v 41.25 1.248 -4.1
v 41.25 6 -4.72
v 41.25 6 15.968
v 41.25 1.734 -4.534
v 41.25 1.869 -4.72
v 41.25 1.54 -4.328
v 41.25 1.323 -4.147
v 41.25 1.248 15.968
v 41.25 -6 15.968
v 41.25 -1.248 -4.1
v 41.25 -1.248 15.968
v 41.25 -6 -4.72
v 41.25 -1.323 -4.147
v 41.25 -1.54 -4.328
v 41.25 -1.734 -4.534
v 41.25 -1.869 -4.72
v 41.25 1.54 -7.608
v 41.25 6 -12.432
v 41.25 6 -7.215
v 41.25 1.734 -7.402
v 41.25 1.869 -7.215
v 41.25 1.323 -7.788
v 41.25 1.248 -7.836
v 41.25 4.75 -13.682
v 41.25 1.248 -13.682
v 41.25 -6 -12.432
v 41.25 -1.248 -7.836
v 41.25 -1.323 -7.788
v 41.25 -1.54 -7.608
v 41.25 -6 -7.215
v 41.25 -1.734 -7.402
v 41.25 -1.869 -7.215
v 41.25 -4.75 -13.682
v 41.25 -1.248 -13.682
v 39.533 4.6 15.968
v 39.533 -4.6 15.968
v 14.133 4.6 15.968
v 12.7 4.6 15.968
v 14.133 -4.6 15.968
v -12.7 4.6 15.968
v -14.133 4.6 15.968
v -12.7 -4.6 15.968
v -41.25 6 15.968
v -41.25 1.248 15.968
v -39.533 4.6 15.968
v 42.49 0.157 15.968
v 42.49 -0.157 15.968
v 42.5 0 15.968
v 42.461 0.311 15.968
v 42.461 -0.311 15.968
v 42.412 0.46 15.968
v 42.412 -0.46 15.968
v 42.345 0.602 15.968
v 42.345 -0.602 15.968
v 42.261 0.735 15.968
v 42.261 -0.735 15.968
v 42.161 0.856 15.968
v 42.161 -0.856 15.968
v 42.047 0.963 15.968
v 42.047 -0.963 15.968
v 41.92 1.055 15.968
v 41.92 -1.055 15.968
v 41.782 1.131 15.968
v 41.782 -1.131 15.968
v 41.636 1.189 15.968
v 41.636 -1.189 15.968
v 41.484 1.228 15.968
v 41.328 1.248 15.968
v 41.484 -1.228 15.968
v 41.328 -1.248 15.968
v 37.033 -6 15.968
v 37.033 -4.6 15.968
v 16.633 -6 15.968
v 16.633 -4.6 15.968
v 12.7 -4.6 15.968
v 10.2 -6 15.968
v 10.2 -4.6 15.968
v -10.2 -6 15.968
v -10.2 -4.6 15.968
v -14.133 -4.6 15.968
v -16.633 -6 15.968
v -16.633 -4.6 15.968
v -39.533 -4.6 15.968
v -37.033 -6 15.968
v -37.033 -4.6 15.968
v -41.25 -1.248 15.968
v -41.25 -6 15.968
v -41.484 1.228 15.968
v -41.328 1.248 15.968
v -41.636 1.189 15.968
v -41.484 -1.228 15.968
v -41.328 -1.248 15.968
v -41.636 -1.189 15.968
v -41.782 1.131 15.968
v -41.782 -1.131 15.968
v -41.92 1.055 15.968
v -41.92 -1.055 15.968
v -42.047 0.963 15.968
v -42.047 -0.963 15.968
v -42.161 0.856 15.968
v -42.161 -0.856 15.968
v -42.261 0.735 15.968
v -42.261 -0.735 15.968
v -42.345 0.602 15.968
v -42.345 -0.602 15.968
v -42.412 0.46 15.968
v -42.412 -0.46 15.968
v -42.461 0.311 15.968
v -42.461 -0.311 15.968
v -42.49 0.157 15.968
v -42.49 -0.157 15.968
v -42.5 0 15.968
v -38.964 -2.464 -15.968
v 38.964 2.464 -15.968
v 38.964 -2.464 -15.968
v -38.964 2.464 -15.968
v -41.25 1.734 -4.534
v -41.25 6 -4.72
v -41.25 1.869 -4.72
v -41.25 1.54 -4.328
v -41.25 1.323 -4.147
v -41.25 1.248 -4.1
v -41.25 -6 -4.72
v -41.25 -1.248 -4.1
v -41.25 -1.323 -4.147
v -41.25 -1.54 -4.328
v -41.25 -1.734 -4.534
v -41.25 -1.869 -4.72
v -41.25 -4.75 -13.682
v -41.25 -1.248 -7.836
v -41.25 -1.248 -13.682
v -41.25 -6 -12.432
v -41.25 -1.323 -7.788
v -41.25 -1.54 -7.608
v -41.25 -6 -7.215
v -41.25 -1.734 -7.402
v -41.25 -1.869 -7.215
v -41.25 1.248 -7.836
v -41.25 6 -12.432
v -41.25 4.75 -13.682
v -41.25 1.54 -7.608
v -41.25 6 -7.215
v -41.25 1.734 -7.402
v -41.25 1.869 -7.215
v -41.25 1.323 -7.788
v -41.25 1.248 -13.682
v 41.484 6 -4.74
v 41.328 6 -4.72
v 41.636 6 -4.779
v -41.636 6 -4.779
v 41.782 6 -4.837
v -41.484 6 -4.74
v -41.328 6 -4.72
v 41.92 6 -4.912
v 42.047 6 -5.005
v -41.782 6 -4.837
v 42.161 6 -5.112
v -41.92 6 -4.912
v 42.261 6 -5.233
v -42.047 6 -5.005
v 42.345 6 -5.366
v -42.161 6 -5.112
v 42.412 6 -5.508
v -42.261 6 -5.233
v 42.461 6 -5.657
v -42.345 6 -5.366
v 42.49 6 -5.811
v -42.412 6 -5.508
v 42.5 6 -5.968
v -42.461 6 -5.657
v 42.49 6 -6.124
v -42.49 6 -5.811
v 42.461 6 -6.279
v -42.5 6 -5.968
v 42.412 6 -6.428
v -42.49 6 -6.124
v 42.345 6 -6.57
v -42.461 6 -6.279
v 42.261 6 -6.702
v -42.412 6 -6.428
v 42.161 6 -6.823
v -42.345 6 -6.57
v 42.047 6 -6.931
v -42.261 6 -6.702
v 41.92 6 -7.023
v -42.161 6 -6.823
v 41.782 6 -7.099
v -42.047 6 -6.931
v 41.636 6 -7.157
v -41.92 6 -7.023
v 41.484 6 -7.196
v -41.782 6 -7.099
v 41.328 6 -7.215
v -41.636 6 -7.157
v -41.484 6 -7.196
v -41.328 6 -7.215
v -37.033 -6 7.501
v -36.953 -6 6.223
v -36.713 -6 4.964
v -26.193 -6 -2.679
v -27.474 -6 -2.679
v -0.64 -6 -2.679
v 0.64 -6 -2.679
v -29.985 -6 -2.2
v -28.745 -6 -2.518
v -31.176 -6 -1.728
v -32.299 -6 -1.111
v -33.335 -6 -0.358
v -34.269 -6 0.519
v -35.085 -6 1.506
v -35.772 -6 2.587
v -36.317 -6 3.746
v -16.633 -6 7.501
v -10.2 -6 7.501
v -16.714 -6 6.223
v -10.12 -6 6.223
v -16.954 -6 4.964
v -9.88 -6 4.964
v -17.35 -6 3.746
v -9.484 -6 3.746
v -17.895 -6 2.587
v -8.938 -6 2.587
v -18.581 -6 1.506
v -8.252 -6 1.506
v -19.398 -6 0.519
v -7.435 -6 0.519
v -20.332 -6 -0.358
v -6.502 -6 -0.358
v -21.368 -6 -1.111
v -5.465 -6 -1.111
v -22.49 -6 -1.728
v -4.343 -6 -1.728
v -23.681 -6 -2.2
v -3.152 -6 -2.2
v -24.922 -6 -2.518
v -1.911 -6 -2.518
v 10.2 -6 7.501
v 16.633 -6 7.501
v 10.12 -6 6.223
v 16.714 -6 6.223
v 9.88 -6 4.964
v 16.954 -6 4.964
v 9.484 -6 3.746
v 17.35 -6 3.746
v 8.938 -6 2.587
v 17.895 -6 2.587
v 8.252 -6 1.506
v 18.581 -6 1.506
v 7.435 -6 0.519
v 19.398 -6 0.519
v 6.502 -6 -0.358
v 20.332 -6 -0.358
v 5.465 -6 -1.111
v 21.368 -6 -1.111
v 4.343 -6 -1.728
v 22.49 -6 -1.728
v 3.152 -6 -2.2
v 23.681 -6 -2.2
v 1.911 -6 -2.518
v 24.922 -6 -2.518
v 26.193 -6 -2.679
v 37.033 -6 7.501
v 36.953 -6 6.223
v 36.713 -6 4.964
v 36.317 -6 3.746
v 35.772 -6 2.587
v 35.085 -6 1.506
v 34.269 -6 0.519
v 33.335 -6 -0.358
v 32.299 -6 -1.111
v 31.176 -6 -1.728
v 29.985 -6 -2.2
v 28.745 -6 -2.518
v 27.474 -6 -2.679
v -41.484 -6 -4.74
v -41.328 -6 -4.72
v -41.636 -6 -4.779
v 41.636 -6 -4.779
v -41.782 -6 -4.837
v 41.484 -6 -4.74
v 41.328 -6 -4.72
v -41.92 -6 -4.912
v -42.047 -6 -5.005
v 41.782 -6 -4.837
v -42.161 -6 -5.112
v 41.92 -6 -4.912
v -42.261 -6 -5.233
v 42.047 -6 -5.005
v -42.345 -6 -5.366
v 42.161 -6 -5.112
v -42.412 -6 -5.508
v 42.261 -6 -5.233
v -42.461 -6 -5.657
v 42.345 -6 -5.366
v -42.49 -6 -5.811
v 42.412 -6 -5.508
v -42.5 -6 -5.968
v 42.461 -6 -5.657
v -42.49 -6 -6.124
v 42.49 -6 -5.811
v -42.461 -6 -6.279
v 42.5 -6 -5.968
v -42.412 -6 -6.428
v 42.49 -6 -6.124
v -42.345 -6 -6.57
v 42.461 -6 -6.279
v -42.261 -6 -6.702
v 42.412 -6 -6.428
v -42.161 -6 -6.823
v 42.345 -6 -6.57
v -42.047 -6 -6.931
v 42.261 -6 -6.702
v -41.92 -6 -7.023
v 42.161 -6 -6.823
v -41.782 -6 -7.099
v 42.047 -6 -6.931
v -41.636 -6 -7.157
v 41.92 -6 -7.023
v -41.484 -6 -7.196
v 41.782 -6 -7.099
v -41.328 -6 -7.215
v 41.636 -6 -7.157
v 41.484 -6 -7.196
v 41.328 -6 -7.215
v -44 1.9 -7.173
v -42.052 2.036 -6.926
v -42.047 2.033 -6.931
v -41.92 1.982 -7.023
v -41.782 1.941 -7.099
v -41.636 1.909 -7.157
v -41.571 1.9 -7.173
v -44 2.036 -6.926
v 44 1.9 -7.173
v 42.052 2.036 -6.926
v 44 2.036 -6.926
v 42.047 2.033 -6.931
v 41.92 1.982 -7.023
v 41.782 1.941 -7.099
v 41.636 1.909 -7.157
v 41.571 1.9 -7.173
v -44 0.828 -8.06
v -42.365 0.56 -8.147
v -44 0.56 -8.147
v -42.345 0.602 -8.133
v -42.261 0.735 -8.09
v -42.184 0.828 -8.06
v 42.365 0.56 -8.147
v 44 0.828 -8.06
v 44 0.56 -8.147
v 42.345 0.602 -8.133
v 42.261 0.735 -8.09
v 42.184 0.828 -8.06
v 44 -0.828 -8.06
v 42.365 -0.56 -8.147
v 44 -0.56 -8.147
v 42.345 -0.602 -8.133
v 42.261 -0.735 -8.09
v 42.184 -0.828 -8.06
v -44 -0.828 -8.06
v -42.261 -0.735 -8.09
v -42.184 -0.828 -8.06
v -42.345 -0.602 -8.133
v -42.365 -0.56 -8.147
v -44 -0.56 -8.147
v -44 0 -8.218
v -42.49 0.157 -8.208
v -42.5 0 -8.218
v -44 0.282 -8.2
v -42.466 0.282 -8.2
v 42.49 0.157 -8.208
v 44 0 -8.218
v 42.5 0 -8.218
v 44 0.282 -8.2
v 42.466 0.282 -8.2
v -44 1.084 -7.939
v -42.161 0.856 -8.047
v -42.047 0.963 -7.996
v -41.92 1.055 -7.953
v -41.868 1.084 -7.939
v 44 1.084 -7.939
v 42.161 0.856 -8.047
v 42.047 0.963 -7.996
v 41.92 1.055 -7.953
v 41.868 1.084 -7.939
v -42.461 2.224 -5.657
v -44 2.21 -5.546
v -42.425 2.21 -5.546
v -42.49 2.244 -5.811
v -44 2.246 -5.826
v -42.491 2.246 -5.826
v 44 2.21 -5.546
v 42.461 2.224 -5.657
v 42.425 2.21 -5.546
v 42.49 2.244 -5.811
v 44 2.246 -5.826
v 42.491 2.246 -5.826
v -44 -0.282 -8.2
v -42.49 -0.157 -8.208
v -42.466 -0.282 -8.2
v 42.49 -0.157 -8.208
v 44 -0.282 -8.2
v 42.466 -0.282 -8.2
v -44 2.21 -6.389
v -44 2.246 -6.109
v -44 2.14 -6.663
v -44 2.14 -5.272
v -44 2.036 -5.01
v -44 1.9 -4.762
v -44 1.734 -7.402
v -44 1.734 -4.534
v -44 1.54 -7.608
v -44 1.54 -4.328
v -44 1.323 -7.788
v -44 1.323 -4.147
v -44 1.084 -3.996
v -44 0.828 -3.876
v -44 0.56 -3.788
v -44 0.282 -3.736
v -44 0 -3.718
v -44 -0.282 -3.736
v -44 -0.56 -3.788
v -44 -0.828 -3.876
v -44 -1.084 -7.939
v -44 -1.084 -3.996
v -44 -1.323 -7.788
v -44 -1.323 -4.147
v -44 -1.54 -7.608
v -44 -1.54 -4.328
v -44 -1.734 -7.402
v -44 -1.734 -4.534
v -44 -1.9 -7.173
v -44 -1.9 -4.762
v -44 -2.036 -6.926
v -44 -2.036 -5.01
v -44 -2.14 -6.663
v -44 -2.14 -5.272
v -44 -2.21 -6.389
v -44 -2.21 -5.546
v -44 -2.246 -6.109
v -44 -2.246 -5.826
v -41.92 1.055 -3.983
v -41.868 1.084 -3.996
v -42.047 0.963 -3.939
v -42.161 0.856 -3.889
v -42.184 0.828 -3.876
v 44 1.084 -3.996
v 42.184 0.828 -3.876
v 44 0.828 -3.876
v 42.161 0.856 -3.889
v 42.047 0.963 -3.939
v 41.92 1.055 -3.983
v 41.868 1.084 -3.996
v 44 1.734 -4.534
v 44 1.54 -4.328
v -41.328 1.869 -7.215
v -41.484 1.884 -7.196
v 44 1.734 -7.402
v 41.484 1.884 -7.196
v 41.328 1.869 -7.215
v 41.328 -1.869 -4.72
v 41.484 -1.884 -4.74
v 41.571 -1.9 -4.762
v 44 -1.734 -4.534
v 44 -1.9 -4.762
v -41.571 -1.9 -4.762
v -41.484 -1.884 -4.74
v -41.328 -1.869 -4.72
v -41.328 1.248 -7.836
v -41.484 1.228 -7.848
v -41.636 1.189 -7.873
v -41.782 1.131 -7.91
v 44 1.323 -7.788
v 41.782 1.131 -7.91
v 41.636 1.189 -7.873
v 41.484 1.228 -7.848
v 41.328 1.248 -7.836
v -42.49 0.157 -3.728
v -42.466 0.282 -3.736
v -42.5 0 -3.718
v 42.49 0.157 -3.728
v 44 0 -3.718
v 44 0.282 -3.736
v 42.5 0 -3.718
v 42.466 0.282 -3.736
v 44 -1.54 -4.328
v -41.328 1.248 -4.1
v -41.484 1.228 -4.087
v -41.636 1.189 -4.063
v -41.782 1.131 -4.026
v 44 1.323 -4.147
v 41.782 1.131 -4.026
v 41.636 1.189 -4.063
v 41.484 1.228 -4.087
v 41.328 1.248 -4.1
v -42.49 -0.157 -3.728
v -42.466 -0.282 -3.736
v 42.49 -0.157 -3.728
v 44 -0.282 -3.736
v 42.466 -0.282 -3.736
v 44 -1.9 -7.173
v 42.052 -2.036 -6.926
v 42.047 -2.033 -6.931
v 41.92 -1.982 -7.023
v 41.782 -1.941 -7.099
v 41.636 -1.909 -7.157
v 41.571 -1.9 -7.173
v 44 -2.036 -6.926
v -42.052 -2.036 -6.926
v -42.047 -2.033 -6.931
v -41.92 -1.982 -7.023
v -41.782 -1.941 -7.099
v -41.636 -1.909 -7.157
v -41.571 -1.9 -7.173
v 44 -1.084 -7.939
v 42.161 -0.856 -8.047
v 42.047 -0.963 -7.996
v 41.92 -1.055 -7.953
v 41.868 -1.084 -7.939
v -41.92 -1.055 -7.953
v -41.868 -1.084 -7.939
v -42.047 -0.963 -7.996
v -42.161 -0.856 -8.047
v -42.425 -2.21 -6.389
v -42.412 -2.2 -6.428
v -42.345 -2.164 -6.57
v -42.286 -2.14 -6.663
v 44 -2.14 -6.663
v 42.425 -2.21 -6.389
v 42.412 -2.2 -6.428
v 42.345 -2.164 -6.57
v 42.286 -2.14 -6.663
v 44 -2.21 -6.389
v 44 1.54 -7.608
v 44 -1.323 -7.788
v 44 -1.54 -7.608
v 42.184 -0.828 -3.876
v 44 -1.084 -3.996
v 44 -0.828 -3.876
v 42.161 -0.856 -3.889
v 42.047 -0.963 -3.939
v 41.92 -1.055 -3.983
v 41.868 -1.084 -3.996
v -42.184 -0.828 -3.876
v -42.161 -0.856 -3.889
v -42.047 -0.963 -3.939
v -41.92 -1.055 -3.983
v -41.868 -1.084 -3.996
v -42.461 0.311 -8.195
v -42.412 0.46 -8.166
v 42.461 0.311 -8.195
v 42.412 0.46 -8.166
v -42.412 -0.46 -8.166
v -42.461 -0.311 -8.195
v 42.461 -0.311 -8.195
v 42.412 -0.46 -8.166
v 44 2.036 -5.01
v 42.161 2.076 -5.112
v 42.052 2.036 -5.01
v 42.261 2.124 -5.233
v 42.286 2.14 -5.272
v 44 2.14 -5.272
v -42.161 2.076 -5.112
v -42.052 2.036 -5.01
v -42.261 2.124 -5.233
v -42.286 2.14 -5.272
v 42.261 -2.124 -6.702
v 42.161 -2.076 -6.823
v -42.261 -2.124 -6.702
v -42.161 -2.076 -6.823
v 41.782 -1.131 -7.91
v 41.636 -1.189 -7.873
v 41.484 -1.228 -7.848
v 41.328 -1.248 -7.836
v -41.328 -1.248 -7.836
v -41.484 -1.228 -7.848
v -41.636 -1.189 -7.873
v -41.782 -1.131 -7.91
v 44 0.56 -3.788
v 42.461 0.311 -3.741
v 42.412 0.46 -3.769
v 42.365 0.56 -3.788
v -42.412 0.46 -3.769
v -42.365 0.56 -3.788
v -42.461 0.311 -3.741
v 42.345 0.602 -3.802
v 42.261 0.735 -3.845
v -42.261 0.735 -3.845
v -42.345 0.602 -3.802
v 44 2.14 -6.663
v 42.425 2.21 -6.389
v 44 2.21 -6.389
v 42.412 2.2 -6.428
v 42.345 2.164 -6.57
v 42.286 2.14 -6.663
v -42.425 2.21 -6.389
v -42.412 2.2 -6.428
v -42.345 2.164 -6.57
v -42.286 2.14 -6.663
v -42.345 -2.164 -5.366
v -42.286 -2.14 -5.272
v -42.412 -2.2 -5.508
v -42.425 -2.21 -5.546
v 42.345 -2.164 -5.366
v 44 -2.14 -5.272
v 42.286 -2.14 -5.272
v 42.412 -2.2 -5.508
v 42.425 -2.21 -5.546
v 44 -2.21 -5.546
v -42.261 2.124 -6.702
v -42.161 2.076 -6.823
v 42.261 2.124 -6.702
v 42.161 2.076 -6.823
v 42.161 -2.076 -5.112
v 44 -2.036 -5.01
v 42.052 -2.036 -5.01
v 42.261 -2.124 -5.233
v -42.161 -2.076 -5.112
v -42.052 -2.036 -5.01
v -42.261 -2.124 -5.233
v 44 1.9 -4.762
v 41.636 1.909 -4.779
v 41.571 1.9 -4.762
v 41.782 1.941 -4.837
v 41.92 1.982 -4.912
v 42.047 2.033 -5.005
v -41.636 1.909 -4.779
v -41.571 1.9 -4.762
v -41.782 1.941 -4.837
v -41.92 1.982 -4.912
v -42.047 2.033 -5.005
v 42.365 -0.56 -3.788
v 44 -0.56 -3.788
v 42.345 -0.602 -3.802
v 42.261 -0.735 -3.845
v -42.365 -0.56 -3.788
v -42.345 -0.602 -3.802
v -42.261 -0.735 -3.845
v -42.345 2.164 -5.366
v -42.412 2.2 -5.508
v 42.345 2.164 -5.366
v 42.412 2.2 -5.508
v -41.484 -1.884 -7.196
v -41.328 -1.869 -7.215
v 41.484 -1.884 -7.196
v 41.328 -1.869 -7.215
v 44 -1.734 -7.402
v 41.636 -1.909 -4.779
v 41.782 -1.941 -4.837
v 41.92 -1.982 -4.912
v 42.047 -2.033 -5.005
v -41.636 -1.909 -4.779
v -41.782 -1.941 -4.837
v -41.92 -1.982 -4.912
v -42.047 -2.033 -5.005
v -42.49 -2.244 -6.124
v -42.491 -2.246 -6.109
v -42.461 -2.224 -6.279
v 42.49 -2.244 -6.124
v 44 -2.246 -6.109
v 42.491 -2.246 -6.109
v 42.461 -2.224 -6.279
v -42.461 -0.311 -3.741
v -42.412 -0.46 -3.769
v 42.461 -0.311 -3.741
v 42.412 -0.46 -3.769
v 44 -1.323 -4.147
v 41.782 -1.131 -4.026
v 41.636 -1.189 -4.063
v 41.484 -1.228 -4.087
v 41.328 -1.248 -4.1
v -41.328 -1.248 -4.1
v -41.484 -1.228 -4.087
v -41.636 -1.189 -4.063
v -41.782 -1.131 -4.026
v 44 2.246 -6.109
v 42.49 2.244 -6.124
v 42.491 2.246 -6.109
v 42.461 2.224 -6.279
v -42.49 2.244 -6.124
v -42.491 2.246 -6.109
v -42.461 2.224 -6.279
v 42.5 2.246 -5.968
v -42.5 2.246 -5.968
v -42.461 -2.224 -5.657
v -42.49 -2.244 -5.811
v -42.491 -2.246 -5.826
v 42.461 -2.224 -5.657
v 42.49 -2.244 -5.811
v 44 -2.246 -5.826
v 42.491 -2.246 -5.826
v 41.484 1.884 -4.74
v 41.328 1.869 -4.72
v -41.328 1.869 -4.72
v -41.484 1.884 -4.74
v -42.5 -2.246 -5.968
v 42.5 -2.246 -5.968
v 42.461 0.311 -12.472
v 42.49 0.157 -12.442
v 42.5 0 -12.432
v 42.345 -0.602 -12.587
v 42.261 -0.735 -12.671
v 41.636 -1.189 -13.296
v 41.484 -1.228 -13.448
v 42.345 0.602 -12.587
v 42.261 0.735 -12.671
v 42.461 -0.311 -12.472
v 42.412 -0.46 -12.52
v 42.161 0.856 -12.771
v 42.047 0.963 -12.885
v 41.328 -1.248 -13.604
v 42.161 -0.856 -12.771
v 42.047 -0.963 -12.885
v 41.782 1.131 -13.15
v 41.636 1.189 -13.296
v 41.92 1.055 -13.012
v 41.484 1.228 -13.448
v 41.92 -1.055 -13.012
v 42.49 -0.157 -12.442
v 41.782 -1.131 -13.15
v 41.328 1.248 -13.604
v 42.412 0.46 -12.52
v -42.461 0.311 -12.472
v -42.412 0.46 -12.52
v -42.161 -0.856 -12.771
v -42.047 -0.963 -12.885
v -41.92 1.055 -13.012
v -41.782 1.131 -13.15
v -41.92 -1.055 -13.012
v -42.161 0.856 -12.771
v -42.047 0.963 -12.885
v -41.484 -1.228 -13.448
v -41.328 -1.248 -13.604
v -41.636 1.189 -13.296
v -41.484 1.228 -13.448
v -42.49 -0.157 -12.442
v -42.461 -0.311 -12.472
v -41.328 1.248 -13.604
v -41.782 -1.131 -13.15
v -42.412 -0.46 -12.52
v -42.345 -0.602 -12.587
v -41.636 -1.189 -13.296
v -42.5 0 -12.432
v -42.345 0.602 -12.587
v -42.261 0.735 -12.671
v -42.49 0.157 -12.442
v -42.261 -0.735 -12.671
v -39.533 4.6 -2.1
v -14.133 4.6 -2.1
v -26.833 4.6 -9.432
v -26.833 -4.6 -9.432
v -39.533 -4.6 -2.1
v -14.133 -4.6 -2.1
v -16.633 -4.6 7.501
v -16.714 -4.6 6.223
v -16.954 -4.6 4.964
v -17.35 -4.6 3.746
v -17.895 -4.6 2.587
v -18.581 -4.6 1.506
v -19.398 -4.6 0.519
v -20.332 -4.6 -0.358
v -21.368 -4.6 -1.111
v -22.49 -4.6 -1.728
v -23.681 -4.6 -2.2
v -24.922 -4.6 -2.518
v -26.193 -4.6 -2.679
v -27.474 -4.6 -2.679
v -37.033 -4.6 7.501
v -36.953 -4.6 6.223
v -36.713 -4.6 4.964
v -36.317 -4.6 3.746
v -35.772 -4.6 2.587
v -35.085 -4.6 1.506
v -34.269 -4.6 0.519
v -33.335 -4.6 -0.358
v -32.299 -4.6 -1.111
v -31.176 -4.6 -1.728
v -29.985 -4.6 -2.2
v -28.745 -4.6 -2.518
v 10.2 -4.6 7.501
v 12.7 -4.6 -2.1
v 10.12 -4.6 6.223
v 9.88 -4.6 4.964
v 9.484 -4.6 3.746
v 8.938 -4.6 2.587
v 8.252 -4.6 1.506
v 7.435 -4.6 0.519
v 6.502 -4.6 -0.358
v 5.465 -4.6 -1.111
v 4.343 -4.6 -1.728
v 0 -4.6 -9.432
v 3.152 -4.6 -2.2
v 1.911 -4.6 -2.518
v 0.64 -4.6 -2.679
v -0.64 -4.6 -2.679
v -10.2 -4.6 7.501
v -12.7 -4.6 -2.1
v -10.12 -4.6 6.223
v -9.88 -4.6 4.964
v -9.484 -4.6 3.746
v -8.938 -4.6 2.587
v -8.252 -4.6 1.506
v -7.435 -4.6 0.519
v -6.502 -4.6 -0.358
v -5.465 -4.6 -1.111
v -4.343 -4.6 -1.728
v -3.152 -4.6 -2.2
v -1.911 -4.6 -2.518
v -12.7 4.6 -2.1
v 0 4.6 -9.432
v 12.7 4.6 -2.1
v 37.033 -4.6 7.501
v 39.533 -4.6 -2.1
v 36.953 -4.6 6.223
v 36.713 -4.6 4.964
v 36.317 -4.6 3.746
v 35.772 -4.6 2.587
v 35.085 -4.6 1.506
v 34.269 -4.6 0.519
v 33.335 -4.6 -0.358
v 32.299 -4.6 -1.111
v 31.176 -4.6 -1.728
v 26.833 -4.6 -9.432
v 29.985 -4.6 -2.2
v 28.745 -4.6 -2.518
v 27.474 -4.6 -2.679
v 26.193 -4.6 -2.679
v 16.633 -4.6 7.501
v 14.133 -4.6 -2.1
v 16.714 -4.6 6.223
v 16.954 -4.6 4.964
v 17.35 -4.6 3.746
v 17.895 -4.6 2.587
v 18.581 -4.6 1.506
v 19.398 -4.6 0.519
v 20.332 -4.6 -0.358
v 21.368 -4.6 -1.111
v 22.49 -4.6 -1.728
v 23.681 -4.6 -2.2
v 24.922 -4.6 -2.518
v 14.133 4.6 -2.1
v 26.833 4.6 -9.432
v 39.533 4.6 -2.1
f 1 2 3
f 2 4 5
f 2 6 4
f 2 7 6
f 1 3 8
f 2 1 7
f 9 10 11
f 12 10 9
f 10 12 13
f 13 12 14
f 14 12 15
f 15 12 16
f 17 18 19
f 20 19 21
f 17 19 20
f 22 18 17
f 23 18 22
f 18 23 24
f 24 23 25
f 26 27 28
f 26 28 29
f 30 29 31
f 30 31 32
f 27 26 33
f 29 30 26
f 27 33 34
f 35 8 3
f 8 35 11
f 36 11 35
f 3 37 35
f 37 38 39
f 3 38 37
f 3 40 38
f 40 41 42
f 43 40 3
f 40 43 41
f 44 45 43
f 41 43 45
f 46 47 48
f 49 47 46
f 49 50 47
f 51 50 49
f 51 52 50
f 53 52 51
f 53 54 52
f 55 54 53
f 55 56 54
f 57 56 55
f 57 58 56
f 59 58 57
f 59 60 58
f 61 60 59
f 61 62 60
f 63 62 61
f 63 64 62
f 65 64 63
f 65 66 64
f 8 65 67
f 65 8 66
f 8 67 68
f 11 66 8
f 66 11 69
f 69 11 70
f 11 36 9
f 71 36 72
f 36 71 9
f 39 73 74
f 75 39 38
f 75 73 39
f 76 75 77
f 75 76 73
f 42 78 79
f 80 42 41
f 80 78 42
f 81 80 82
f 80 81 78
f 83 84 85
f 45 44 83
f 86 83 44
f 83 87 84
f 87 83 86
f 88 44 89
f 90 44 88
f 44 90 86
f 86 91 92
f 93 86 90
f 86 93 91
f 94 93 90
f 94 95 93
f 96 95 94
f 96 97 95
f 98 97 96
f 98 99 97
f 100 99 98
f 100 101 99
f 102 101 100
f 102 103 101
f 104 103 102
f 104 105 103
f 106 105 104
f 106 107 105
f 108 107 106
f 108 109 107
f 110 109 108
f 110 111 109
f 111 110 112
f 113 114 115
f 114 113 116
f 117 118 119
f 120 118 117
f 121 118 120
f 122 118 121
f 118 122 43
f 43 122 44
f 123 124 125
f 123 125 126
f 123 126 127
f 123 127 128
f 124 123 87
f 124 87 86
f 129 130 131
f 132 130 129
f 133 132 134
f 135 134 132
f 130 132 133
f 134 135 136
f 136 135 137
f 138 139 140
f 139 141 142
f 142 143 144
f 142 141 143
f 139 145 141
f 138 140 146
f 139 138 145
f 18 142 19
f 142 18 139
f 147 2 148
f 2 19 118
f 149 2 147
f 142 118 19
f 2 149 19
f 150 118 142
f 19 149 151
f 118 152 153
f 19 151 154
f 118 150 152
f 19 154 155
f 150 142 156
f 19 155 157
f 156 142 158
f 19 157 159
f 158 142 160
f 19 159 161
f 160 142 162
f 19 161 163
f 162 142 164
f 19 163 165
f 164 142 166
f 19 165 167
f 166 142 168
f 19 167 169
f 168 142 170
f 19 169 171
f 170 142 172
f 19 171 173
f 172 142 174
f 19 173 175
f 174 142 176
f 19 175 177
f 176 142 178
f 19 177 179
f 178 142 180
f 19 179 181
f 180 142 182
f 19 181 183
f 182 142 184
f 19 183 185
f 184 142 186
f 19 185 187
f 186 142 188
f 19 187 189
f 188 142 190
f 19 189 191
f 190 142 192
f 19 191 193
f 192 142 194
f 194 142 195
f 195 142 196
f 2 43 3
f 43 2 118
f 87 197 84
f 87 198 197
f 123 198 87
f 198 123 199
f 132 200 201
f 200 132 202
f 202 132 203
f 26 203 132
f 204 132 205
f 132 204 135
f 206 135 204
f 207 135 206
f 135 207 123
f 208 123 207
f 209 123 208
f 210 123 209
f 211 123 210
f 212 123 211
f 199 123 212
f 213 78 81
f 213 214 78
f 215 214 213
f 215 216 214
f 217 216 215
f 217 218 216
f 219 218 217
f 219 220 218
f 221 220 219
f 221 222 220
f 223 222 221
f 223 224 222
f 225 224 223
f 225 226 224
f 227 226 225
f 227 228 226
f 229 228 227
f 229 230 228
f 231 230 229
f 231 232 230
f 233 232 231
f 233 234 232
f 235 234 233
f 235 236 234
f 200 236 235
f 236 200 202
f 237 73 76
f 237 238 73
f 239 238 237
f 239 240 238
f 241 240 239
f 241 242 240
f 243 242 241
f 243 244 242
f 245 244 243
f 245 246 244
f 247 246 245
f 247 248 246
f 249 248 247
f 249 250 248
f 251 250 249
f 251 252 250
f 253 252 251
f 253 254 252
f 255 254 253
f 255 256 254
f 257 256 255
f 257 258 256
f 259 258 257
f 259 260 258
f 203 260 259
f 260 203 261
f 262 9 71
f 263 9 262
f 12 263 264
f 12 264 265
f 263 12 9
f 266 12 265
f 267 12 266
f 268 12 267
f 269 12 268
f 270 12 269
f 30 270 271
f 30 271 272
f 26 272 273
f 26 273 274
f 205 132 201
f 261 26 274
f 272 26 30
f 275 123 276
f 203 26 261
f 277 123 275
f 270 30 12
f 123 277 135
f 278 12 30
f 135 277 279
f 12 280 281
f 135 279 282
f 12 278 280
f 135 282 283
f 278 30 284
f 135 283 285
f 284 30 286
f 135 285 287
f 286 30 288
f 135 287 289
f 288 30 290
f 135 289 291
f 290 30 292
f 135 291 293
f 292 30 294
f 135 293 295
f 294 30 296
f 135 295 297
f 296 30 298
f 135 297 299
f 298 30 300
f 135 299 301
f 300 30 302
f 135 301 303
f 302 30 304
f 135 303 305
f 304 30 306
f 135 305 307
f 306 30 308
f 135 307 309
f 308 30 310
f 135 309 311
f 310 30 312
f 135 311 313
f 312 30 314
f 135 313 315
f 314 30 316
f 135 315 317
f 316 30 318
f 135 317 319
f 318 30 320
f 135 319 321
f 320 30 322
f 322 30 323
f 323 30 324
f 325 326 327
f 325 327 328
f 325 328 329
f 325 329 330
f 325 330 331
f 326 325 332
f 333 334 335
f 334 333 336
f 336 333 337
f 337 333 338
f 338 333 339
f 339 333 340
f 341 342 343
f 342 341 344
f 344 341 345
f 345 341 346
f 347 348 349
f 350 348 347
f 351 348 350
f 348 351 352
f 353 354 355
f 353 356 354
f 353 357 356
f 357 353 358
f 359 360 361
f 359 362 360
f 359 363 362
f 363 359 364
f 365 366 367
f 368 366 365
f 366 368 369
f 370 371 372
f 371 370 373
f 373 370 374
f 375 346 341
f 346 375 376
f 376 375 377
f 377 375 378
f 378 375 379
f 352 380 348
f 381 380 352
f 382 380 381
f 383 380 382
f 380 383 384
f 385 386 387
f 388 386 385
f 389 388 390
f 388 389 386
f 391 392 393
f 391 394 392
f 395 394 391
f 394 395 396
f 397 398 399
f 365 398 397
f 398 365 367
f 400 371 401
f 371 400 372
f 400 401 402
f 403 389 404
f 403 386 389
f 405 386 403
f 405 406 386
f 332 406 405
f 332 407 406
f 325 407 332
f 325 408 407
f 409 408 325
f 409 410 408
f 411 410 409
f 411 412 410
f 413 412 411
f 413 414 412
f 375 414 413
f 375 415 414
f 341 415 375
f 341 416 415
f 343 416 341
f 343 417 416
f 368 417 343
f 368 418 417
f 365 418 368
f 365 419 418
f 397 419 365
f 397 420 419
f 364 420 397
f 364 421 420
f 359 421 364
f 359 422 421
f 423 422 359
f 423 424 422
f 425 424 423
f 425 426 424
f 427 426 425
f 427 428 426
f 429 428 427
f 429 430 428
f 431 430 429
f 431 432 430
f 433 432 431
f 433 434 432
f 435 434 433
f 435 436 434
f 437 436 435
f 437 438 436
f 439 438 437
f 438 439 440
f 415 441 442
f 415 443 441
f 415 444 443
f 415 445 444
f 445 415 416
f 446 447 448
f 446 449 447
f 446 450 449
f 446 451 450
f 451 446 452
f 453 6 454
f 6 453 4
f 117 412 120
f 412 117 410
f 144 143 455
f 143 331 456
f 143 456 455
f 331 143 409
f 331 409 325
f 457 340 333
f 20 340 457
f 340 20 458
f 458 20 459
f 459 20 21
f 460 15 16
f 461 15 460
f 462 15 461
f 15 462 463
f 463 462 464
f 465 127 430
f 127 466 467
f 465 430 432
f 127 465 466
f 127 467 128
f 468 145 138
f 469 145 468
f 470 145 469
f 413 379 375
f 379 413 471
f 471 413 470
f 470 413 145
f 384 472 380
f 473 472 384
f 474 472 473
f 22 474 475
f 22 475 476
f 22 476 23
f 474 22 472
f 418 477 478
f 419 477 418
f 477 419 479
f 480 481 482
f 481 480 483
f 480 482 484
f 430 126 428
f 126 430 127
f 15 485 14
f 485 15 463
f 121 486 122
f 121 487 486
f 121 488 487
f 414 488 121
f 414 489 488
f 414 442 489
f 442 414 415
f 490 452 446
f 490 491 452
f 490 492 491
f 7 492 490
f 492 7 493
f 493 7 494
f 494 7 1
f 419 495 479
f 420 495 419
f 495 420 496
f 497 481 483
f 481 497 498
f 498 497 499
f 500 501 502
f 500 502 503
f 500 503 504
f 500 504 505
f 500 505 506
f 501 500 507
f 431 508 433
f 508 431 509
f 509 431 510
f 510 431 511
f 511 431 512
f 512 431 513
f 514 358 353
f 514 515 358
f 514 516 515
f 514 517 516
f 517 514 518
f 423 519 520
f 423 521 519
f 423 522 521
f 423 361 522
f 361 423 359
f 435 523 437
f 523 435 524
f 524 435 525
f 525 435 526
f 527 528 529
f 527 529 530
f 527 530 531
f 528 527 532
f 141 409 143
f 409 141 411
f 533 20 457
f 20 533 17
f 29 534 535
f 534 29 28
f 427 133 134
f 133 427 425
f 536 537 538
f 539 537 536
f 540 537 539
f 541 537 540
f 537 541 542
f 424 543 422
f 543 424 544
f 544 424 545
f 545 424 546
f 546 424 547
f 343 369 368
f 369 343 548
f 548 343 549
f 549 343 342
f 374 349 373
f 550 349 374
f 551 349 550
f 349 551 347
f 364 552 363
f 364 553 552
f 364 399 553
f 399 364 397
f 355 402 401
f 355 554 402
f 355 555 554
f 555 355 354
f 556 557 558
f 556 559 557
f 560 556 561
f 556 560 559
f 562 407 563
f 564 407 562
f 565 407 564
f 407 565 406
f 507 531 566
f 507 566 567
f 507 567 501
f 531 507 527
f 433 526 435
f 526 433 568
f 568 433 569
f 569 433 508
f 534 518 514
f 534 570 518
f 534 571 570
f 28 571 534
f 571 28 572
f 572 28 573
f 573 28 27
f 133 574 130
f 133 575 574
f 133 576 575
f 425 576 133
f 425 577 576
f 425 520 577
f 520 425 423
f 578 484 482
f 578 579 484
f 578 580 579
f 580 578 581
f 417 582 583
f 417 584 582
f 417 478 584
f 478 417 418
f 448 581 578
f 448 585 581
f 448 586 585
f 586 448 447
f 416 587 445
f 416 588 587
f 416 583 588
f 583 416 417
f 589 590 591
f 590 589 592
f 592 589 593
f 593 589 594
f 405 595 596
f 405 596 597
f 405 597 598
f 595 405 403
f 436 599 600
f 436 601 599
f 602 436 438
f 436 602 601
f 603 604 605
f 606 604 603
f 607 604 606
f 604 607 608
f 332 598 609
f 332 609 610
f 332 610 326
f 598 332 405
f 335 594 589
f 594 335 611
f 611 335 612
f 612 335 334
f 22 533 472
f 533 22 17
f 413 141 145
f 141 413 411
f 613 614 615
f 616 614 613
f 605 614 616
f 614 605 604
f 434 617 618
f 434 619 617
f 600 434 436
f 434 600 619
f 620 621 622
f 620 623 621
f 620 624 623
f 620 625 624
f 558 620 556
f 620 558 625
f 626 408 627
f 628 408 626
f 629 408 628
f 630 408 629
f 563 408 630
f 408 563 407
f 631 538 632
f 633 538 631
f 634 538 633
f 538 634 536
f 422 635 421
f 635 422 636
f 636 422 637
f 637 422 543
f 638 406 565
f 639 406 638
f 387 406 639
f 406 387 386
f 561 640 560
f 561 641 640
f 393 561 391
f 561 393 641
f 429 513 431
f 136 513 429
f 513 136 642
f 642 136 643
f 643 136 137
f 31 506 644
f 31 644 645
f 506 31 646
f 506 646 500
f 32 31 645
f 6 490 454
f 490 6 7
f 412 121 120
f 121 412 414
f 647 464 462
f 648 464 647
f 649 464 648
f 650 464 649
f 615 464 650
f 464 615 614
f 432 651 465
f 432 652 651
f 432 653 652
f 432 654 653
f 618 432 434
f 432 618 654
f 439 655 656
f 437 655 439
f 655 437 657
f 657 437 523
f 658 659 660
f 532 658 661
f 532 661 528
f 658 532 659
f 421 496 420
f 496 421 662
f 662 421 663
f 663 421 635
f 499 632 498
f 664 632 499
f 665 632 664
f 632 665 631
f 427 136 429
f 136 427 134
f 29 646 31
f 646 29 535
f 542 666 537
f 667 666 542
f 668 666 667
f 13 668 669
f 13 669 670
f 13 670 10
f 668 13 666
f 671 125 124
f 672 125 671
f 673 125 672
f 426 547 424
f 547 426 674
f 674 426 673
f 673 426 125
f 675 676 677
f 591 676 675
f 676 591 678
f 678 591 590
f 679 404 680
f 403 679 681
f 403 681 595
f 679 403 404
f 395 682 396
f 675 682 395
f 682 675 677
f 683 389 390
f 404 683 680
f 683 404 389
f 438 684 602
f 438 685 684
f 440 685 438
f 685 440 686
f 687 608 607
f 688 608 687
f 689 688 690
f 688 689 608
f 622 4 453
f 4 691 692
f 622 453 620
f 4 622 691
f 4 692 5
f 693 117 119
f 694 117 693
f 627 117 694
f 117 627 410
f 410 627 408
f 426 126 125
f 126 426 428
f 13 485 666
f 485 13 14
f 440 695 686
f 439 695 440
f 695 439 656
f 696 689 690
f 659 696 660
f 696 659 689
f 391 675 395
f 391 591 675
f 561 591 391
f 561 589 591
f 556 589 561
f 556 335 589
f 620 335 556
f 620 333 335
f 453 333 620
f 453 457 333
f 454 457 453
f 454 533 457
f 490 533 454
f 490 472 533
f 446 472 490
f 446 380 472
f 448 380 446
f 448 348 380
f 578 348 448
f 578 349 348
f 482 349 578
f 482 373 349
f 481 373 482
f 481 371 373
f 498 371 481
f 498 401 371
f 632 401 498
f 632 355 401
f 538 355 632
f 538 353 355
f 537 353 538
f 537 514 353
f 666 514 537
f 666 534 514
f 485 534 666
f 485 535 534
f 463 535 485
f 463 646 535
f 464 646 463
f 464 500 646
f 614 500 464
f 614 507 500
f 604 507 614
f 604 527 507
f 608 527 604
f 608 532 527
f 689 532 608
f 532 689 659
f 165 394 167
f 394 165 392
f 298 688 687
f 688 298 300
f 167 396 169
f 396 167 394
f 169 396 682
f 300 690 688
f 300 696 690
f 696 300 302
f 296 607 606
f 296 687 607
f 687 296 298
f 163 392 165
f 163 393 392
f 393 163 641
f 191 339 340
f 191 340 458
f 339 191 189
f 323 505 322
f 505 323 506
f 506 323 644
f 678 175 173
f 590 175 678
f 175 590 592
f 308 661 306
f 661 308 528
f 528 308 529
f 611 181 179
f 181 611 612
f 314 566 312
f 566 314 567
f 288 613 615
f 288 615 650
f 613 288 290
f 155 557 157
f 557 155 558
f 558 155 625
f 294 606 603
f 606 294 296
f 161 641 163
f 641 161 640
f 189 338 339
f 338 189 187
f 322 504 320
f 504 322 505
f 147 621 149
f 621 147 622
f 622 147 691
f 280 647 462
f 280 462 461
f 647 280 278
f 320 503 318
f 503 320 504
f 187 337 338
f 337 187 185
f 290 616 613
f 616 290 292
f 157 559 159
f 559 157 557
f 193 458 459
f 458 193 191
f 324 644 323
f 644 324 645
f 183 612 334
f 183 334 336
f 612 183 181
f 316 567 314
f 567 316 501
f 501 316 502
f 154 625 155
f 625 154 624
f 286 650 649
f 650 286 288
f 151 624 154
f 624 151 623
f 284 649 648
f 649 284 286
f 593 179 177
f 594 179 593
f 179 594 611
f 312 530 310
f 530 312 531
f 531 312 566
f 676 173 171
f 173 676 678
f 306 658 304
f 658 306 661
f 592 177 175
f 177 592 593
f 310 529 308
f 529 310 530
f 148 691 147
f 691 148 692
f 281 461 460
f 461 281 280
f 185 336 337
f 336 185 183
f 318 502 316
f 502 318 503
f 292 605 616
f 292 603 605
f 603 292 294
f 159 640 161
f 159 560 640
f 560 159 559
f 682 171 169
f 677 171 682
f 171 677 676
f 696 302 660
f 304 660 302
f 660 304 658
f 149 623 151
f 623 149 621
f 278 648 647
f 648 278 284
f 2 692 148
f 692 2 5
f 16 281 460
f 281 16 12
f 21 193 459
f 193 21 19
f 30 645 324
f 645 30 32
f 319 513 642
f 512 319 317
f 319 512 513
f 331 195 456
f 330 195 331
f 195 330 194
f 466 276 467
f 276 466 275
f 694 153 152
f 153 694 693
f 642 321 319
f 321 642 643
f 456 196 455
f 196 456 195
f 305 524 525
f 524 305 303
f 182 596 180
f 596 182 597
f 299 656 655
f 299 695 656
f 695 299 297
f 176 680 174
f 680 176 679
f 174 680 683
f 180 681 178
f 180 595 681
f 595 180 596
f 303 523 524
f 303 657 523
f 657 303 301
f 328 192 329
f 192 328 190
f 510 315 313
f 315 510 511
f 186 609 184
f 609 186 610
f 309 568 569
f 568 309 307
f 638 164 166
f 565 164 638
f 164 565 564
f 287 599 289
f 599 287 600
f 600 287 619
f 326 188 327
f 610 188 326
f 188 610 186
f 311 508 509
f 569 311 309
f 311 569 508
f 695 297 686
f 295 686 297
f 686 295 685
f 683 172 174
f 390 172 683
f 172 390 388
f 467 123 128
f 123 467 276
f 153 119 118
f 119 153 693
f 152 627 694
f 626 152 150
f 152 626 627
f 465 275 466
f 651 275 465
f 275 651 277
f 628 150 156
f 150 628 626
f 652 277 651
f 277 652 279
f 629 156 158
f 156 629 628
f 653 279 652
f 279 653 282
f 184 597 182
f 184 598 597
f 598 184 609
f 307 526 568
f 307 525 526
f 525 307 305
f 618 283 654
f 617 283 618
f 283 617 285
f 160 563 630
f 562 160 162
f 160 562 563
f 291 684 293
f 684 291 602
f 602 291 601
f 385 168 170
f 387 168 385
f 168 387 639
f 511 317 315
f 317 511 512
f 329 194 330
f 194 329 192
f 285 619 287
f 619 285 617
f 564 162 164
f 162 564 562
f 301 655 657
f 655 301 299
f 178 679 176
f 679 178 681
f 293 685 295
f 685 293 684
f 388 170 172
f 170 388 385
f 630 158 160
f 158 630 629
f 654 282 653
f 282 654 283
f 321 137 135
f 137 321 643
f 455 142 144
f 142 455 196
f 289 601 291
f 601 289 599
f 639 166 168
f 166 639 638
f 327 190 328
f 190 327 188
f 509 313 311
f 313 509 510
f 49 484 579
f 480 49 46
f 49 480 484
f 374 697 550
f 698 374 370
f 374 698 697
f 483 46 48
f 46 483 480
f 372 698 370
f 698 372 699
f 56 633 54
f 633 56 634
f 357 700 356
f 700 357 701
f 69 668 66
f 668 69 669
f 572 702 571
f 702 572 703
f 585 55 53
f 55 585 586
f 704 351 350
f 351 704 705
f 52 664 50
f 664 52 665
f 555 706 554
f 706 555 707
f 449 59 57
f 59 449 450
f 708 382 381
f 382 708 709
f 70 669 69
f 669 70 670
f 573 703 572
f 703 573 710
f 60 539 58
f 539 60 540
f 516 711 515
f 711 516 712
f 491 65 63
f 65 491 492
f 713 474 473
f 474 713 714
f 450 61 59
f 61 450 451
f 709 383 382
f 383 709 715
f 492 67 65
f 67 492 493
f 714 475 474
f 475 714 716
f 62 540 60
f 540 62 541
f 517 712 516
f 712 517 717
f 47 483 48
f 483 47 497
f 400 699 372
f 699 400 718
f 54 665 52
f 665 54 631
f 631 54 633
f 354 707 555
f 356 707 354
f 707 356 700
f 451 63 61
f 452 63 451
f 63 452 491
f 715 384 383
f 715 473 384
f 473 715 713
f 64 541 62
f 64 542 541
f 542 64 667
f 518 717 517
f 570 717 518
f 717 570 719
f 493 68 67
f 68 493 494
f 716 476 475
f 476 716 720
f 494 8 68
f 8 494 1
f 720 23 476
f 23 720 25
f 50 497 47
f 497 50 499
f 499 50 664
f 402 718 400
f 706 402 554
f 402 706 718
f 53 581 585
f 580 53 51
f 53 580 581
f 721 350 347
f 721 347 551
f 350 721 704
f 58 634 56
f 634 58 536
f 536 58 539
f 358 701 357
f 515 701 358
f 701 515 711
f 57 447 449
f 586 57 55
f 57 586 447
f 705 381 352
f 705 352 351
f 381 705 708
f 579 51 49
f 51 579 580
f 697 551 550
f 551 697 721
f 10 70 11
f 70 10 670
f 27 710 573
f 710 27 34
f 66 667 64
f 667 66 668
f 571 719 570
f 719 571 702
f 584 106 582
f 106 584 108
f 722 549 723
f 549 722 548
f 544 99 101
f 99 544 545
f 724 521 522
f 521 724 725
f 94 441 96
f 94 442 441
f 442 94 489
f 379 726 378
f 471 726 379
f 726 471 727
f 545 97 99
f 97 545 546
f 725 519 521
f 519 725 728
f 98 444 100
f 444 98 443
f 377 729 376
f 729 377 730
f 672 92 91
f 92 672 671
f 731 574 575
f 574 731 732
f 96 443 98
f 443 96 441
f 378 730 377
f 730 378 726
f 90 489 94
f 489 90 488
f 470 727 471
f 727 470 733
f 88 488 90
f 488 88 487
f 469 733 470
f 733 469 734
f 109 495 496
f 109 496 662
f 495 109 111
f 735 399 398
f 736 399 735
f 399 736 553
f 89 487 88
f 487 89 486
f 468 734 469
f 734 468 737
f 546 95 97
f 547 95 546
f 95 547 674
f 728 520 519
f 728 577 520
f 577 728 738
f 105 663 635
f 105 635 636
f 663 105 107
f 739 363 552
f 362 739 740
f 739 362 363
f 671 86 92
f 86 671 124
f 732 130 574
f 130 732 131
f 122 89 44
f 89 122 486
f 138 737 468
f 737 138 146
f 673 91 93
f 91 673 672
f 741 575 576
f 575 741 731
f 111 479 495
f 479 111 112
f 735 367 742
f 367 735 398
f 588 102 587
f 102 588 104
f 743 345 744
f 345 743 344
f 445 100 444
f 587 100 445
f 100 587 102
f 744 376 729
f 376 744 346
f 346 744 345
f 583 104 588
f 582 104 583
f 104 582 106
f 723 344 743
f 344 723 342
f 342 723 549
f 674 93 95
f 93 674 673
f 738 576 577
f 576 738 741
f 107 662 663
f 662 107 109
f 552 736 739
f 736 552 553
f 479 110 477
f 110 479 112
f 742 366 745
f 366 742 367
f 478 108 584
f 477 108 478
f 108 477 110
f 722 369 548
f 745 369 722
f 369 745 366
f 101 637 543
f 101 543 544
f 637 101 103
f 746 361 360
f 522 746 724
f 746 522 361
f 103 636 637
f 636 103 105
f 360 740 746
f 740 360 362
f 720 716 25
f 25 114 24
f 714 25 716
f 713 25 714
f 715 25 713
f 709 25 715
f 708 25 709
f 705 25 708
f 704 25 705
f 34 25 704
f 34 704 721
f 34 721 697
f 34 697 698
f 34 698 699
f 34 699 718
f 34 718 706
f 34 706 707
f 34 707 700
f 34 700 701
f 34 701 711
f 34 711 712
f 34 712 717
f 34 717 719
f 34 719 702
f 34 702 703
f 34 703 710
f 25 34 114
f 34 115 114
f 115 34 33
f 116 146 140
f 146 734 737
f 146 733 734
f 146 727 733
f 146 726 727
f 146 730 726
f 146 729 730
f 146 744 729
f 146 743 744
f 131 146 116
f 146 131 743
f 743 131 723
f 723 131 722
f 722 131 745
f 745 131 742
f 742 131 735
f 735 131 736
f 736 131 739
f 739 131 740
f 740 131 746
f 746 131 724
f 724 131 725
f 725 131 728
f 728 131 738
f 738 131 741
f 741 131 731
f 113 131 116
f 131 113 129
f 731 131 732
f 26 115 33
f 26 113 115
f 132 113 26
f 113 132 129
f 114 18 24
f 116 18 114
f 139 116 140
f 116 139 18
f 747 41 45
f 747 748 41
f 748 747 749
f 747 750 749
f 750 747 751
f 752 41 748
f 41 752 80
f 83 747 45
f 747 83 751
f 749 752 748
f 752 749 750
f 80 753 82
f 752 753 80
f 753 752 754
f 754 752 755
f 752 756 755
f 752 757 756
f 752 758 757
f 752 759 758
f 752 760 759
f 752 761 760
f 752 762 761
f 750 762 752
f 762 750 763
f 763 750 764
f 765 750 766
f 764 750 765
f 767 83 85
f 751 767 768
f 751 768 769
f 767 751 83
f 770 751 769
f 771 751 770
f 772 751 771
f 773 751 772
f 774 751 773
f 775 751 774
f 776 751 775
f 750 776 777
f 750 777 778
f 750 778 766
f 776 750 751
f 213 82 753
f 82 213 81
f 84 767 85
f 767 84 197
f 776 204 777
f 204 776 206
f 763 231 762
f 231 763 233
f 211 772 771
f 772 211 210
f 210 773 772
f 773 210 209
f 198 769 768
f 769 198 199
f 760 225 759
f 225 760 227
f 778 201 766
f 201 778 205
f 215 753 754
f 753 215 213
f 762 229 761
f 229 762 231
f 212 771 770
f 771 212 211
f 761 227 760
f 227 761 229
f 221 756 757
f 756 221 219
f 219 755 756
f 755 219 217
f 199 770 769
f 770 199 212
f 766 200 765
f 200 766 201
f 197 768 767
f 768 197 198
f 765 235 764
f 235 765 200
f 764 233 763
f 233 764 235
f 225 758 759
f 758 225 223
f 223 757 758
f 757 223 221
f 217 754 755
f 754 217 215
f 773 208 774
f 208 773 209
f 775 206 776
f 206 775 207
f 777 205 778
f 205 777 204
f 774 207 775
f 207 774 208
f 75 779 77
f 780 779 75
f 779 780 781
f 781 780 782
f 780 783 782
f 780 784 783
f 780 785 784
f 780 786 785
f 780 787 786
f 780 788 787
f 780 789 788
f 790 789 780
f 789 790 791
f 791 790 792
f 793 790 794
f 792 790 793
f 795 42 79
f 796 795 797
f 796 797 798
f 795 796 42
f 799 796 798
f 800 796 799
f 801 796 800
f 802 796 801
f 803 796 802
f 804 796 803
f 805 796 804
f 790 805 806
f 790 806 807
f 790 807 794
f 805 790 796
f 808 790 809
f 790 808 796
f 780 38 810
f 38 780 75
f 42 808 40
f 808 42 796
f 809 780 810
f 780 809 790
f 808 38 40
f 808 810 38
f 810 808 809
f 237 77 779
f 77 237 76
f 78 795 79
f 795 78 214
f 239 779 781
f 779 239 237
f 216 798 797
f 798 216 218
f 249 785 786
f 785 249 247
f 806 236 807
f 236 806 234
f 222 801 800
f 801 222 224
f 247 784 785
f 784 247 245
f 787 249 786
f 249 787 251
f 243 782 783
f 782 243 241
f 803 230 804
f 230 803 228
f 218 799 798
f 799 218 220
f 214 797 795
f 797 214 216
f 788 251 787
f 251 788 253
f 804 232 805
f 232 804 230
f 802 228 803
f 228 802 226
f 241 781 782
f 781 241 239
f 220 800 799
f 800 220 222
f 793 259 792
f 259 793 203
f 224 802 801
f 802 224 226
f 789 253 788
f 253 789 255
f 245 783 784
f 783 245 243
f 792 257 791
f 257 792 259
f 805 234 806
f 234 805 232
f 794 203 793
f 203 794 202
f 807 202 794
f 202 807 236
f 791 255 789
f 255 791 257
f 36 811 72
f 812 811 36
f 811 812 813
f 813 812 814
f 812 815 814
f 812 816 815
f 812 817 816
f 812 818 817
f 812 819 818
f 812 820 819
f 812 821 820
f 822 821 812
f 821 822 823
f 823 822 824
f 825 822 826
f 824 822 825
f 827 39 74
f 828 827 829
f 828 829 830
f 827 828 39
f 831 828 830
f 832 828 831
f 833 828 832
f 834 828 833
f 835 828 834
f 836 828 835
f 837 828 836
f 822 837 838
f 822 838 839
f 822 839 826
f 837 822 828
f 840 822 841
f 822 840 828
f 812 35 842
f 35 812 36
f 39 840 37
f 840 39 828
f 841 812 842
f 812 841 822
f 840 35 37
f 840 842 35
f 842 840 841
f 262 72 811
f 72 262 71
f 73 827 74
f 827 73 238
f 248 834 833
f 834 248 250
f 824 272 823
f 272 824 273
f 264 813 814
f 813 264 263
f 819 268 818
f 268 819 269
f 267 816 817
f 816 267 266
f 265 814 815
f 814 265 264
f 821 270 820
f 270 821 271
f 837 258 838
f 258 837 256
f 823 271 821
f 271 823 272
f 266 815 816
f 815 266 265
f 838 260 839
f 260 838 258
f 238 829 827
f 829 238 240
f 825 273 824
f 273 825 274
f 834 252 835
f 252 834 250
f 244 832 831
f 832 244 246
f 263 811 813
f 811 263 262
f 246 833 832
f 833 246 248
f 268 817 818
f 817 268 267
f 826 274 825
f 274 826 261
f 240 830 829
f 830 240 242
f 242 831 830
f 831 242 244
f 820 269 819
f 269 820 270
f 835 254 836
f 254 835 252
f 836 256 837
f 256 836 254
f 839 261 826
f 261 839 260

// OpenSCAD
/************** BEST VIEWED IN A CODE EDITOR 80 COLUMNS WIDE *******************
*
* Milwaukee Die Holders
* Benjamen Johnson <workshop.electronsmith.com>
* 20191003
* Version 6
* openSCAD Version: 2019.05
*******************************************************************************/


/*******************************************************************************
*
*   ---      -----  -----
*  |   |   /       \    |
*  |   |  /         \   | <- die_width
*  |   |  \         /   |
*  |   |   \       /    |
*   ---     -----  -----
*  |   |
*  |   | <- die_thickness
*
*******************************************************************************/
/*[Hidden]*/
die_width_array = [16.2,25.4];
die_thickness_array = [6.5,9.2];
num_slot_array = [5,3];
die_bottom_pos_array = [0,3]; //3 for 5/8" dies
body_depth_array = [11,12];

/*[Die Parameters]*/
//Dummy variable to fix Customizer
dummy = 1;

// type or size of die
die_type = 1; //[0:Small Die (5/8-in), 1:Standard Die (1-in)]

// Die width adjustment (ex, 1.01 would be 101% of fixed width)
die_width_adj = 1;

// Width of dies across the flats
die_width = die_width_array[die_type] * die_width_adj;

// array of slot widths
num_slots = num_slot_array[die_type];

// Die thickness adjustment (ex, 0.99 would be 99% of fixed thickness )
die_thickness_adj = 1;

// Thickness of the die
die_thickness = die_thickness_array[die_type] * die_thickness_adj;

// Width of dies across the points
die_width_pt_to_pt = die_width/sin(60);

/*[Holder Parameters]*/
/*******************************************************************************
*    /\ /\ /\ /\ /\ /\ /\ /\ /\ /\  < ---- bits
*   -------------------------------  --
*  |                               |  body_height 
*  |                               |
*   -------------------------------  --
*  |< ------- body_width --------->|
*   -------------------------------  --
*  | X  X  X  X  X  X  X  X  X  X  |  body_depth
*   -------------------------------  --
*
*  || <- min_edge
*   -----------
*  | --- | --- | --
*  ||   |||   ||  slot_width
*  | --- | --- | --
*   -----------
*         |   | <- slot_length (I know these seem backward in 2D)
*  
*******************************************************************************/
// adjust height of holder
height_adjustment = 0;

// figure out where the bottom of the die sits
die_bottom_pos = die_bottom_pos_array[die_type]+height_adjustment;

// how much to chamfer the ends
bottom_chamfer = 5;

// how much material to leave at the bottom of the bit slots
bottom_thickness = sqrt(pow(bottom_chamfer,2)/2) + die_bottom_pos;

// width of the holder body
body_width = 82.5 ; // 82.5

// adjust the body depth (ex, 1.01 would be 101% of fixed depth)
body_depth_adj = 1;

// depth of holder
body_depth = body_depth_array[die_type] * body_depth_adj;

// height of holder
body_height = die_width + bottom_thickness;

// length of slot (side to side)
slot_length = die_width;

// width of the bit slot (front to back)
slot_width = die_thickness;

//width of the finger slot
finger_width = die_width - 5;

// minimum wall thickness at the edge of the holder
min_edge = 1;

/*[Connector Parameters]*/
/*******************************************************************************
*     -------------------------------
*   -| X  X  X  X  X  X  X  X  X  X  |-
*     -------------------------------
*  | <------ total_pin_length -------->|
*
*             -------
*        --  |---O---|  o <- pin_dia (diamter of pivot pin)
* pin_height |   |   | 
*            |   |   |    <- catch_dia (diameter of the semicircular catches)
*        --   -------
******************************************************************************/
// Length of cylinder passing through the holder that it rotates on 
total_pin_length = 88; // 88

// diameter of the above cylinder
pin_dia = 4.5; // 4.5

// diameter of the semicircular catches
catch_dia = 2.5;

// pin distance from the bottom of holder;
pin_height = 10; 

/*[Expert]*/
// add a slight offset to cuts to make model render properly
render_offset = 0.01; //0.005

difference(){

    // make the basic holder
    MilwaukeeHolder();

    //calculations for positioning the slots
    width2= body_width - 2 * min_edge;
    step = width2 /(num_slots);
    start = -width2/2+step/2;
    end = width2/2;
    
    for (x=[start:step:end]){
        // cut the slots for the discs
        translate([x,0,-(body_height-die_width_pt_to_pt)/2+bottom_thickness])rotate([90,30,0])cylinder(d=die_width_pt_to_pt, die_thickness, center=true, $fn=6);
        translate([x,0,bottom_thickness+die_width_pt_to_pt/2])cube([die_width,die_thickness,body_height],center=true);
        
        // cut the finger holes
        translate([x,-4,(2/3)*die_width+bottom_thickness])cube([finger_width,die_thickness,body_height],center=true);
        translate([x,-4,-body_height/2+(2/3)*die_width+bottom_thickness])rotate([90,0,0])cylinder(h=slot_width, d=finger_width, center=true, $fn=50);
        }//end for

}//end difference

module MilwaukeeHolder(){
    
    // calculate where to put the pin
    pin_pos = - body_height/2+pin_height;

    difference(){
        union(){
            // Form the main body
            cube([body_width,body_depth,body_height],center = true);
                    
            // form the pivot pins
            translate([0,0,pin_pos])rotate([0,90,0])cylinder(d=pin_dia,h=total_pin_length,center=true,$fn=50);
            
            //form the horizontal catches
            translate([body_width/2,0,pin_pos])rotate([90,0,0])cylinder(d=catch_dia,h=body_depth,center=true,$fn=50);
            translate([-body_width/2,0,pin_pos])rotate([90,0,0])cylinder(d=catch_dia,h=body_depth,center=true,$fn=50);
            
            //form the vertical catches
            translate([body_width/2,0,0])rotate([0,0,0])cylinder(d=catch_dia,h=body_height,center=true,$fn=50);
            translate([-body_width/2,0,0])rotate([0,0,0])cylinder(d=catch_dia,h=body_height,center=true,$fn=50);
        } // end union
        
        //cut off bottom corners
        translate([(body_width+catch_dia)/2,0,-body_height/2])rotate([0,45,0])cube([bottom_chamfer,body_depth+render_offset,bottom_chamfer],center=true);
        translate([-(body_width+catch_dia)/2,0,-body_height/2])rotate([0,45,0])cube([bottom_chamfer,body_depth+render_offset,bottom_chamfer],center=true);
        translate([0,-body_depth/2,-body_height/2])rotate([45,0,0])cube([body_width+render_offset, bottom_chamfer ,bottom_chamfer],center=true);
        translate([0,body_depth/2,-body_height/2])rotate([45,0,0])cube([body_width+render_offset, bottom_chamfer ,bottom_chamfer],center=true);     
    
    }//end difference
} // end module
